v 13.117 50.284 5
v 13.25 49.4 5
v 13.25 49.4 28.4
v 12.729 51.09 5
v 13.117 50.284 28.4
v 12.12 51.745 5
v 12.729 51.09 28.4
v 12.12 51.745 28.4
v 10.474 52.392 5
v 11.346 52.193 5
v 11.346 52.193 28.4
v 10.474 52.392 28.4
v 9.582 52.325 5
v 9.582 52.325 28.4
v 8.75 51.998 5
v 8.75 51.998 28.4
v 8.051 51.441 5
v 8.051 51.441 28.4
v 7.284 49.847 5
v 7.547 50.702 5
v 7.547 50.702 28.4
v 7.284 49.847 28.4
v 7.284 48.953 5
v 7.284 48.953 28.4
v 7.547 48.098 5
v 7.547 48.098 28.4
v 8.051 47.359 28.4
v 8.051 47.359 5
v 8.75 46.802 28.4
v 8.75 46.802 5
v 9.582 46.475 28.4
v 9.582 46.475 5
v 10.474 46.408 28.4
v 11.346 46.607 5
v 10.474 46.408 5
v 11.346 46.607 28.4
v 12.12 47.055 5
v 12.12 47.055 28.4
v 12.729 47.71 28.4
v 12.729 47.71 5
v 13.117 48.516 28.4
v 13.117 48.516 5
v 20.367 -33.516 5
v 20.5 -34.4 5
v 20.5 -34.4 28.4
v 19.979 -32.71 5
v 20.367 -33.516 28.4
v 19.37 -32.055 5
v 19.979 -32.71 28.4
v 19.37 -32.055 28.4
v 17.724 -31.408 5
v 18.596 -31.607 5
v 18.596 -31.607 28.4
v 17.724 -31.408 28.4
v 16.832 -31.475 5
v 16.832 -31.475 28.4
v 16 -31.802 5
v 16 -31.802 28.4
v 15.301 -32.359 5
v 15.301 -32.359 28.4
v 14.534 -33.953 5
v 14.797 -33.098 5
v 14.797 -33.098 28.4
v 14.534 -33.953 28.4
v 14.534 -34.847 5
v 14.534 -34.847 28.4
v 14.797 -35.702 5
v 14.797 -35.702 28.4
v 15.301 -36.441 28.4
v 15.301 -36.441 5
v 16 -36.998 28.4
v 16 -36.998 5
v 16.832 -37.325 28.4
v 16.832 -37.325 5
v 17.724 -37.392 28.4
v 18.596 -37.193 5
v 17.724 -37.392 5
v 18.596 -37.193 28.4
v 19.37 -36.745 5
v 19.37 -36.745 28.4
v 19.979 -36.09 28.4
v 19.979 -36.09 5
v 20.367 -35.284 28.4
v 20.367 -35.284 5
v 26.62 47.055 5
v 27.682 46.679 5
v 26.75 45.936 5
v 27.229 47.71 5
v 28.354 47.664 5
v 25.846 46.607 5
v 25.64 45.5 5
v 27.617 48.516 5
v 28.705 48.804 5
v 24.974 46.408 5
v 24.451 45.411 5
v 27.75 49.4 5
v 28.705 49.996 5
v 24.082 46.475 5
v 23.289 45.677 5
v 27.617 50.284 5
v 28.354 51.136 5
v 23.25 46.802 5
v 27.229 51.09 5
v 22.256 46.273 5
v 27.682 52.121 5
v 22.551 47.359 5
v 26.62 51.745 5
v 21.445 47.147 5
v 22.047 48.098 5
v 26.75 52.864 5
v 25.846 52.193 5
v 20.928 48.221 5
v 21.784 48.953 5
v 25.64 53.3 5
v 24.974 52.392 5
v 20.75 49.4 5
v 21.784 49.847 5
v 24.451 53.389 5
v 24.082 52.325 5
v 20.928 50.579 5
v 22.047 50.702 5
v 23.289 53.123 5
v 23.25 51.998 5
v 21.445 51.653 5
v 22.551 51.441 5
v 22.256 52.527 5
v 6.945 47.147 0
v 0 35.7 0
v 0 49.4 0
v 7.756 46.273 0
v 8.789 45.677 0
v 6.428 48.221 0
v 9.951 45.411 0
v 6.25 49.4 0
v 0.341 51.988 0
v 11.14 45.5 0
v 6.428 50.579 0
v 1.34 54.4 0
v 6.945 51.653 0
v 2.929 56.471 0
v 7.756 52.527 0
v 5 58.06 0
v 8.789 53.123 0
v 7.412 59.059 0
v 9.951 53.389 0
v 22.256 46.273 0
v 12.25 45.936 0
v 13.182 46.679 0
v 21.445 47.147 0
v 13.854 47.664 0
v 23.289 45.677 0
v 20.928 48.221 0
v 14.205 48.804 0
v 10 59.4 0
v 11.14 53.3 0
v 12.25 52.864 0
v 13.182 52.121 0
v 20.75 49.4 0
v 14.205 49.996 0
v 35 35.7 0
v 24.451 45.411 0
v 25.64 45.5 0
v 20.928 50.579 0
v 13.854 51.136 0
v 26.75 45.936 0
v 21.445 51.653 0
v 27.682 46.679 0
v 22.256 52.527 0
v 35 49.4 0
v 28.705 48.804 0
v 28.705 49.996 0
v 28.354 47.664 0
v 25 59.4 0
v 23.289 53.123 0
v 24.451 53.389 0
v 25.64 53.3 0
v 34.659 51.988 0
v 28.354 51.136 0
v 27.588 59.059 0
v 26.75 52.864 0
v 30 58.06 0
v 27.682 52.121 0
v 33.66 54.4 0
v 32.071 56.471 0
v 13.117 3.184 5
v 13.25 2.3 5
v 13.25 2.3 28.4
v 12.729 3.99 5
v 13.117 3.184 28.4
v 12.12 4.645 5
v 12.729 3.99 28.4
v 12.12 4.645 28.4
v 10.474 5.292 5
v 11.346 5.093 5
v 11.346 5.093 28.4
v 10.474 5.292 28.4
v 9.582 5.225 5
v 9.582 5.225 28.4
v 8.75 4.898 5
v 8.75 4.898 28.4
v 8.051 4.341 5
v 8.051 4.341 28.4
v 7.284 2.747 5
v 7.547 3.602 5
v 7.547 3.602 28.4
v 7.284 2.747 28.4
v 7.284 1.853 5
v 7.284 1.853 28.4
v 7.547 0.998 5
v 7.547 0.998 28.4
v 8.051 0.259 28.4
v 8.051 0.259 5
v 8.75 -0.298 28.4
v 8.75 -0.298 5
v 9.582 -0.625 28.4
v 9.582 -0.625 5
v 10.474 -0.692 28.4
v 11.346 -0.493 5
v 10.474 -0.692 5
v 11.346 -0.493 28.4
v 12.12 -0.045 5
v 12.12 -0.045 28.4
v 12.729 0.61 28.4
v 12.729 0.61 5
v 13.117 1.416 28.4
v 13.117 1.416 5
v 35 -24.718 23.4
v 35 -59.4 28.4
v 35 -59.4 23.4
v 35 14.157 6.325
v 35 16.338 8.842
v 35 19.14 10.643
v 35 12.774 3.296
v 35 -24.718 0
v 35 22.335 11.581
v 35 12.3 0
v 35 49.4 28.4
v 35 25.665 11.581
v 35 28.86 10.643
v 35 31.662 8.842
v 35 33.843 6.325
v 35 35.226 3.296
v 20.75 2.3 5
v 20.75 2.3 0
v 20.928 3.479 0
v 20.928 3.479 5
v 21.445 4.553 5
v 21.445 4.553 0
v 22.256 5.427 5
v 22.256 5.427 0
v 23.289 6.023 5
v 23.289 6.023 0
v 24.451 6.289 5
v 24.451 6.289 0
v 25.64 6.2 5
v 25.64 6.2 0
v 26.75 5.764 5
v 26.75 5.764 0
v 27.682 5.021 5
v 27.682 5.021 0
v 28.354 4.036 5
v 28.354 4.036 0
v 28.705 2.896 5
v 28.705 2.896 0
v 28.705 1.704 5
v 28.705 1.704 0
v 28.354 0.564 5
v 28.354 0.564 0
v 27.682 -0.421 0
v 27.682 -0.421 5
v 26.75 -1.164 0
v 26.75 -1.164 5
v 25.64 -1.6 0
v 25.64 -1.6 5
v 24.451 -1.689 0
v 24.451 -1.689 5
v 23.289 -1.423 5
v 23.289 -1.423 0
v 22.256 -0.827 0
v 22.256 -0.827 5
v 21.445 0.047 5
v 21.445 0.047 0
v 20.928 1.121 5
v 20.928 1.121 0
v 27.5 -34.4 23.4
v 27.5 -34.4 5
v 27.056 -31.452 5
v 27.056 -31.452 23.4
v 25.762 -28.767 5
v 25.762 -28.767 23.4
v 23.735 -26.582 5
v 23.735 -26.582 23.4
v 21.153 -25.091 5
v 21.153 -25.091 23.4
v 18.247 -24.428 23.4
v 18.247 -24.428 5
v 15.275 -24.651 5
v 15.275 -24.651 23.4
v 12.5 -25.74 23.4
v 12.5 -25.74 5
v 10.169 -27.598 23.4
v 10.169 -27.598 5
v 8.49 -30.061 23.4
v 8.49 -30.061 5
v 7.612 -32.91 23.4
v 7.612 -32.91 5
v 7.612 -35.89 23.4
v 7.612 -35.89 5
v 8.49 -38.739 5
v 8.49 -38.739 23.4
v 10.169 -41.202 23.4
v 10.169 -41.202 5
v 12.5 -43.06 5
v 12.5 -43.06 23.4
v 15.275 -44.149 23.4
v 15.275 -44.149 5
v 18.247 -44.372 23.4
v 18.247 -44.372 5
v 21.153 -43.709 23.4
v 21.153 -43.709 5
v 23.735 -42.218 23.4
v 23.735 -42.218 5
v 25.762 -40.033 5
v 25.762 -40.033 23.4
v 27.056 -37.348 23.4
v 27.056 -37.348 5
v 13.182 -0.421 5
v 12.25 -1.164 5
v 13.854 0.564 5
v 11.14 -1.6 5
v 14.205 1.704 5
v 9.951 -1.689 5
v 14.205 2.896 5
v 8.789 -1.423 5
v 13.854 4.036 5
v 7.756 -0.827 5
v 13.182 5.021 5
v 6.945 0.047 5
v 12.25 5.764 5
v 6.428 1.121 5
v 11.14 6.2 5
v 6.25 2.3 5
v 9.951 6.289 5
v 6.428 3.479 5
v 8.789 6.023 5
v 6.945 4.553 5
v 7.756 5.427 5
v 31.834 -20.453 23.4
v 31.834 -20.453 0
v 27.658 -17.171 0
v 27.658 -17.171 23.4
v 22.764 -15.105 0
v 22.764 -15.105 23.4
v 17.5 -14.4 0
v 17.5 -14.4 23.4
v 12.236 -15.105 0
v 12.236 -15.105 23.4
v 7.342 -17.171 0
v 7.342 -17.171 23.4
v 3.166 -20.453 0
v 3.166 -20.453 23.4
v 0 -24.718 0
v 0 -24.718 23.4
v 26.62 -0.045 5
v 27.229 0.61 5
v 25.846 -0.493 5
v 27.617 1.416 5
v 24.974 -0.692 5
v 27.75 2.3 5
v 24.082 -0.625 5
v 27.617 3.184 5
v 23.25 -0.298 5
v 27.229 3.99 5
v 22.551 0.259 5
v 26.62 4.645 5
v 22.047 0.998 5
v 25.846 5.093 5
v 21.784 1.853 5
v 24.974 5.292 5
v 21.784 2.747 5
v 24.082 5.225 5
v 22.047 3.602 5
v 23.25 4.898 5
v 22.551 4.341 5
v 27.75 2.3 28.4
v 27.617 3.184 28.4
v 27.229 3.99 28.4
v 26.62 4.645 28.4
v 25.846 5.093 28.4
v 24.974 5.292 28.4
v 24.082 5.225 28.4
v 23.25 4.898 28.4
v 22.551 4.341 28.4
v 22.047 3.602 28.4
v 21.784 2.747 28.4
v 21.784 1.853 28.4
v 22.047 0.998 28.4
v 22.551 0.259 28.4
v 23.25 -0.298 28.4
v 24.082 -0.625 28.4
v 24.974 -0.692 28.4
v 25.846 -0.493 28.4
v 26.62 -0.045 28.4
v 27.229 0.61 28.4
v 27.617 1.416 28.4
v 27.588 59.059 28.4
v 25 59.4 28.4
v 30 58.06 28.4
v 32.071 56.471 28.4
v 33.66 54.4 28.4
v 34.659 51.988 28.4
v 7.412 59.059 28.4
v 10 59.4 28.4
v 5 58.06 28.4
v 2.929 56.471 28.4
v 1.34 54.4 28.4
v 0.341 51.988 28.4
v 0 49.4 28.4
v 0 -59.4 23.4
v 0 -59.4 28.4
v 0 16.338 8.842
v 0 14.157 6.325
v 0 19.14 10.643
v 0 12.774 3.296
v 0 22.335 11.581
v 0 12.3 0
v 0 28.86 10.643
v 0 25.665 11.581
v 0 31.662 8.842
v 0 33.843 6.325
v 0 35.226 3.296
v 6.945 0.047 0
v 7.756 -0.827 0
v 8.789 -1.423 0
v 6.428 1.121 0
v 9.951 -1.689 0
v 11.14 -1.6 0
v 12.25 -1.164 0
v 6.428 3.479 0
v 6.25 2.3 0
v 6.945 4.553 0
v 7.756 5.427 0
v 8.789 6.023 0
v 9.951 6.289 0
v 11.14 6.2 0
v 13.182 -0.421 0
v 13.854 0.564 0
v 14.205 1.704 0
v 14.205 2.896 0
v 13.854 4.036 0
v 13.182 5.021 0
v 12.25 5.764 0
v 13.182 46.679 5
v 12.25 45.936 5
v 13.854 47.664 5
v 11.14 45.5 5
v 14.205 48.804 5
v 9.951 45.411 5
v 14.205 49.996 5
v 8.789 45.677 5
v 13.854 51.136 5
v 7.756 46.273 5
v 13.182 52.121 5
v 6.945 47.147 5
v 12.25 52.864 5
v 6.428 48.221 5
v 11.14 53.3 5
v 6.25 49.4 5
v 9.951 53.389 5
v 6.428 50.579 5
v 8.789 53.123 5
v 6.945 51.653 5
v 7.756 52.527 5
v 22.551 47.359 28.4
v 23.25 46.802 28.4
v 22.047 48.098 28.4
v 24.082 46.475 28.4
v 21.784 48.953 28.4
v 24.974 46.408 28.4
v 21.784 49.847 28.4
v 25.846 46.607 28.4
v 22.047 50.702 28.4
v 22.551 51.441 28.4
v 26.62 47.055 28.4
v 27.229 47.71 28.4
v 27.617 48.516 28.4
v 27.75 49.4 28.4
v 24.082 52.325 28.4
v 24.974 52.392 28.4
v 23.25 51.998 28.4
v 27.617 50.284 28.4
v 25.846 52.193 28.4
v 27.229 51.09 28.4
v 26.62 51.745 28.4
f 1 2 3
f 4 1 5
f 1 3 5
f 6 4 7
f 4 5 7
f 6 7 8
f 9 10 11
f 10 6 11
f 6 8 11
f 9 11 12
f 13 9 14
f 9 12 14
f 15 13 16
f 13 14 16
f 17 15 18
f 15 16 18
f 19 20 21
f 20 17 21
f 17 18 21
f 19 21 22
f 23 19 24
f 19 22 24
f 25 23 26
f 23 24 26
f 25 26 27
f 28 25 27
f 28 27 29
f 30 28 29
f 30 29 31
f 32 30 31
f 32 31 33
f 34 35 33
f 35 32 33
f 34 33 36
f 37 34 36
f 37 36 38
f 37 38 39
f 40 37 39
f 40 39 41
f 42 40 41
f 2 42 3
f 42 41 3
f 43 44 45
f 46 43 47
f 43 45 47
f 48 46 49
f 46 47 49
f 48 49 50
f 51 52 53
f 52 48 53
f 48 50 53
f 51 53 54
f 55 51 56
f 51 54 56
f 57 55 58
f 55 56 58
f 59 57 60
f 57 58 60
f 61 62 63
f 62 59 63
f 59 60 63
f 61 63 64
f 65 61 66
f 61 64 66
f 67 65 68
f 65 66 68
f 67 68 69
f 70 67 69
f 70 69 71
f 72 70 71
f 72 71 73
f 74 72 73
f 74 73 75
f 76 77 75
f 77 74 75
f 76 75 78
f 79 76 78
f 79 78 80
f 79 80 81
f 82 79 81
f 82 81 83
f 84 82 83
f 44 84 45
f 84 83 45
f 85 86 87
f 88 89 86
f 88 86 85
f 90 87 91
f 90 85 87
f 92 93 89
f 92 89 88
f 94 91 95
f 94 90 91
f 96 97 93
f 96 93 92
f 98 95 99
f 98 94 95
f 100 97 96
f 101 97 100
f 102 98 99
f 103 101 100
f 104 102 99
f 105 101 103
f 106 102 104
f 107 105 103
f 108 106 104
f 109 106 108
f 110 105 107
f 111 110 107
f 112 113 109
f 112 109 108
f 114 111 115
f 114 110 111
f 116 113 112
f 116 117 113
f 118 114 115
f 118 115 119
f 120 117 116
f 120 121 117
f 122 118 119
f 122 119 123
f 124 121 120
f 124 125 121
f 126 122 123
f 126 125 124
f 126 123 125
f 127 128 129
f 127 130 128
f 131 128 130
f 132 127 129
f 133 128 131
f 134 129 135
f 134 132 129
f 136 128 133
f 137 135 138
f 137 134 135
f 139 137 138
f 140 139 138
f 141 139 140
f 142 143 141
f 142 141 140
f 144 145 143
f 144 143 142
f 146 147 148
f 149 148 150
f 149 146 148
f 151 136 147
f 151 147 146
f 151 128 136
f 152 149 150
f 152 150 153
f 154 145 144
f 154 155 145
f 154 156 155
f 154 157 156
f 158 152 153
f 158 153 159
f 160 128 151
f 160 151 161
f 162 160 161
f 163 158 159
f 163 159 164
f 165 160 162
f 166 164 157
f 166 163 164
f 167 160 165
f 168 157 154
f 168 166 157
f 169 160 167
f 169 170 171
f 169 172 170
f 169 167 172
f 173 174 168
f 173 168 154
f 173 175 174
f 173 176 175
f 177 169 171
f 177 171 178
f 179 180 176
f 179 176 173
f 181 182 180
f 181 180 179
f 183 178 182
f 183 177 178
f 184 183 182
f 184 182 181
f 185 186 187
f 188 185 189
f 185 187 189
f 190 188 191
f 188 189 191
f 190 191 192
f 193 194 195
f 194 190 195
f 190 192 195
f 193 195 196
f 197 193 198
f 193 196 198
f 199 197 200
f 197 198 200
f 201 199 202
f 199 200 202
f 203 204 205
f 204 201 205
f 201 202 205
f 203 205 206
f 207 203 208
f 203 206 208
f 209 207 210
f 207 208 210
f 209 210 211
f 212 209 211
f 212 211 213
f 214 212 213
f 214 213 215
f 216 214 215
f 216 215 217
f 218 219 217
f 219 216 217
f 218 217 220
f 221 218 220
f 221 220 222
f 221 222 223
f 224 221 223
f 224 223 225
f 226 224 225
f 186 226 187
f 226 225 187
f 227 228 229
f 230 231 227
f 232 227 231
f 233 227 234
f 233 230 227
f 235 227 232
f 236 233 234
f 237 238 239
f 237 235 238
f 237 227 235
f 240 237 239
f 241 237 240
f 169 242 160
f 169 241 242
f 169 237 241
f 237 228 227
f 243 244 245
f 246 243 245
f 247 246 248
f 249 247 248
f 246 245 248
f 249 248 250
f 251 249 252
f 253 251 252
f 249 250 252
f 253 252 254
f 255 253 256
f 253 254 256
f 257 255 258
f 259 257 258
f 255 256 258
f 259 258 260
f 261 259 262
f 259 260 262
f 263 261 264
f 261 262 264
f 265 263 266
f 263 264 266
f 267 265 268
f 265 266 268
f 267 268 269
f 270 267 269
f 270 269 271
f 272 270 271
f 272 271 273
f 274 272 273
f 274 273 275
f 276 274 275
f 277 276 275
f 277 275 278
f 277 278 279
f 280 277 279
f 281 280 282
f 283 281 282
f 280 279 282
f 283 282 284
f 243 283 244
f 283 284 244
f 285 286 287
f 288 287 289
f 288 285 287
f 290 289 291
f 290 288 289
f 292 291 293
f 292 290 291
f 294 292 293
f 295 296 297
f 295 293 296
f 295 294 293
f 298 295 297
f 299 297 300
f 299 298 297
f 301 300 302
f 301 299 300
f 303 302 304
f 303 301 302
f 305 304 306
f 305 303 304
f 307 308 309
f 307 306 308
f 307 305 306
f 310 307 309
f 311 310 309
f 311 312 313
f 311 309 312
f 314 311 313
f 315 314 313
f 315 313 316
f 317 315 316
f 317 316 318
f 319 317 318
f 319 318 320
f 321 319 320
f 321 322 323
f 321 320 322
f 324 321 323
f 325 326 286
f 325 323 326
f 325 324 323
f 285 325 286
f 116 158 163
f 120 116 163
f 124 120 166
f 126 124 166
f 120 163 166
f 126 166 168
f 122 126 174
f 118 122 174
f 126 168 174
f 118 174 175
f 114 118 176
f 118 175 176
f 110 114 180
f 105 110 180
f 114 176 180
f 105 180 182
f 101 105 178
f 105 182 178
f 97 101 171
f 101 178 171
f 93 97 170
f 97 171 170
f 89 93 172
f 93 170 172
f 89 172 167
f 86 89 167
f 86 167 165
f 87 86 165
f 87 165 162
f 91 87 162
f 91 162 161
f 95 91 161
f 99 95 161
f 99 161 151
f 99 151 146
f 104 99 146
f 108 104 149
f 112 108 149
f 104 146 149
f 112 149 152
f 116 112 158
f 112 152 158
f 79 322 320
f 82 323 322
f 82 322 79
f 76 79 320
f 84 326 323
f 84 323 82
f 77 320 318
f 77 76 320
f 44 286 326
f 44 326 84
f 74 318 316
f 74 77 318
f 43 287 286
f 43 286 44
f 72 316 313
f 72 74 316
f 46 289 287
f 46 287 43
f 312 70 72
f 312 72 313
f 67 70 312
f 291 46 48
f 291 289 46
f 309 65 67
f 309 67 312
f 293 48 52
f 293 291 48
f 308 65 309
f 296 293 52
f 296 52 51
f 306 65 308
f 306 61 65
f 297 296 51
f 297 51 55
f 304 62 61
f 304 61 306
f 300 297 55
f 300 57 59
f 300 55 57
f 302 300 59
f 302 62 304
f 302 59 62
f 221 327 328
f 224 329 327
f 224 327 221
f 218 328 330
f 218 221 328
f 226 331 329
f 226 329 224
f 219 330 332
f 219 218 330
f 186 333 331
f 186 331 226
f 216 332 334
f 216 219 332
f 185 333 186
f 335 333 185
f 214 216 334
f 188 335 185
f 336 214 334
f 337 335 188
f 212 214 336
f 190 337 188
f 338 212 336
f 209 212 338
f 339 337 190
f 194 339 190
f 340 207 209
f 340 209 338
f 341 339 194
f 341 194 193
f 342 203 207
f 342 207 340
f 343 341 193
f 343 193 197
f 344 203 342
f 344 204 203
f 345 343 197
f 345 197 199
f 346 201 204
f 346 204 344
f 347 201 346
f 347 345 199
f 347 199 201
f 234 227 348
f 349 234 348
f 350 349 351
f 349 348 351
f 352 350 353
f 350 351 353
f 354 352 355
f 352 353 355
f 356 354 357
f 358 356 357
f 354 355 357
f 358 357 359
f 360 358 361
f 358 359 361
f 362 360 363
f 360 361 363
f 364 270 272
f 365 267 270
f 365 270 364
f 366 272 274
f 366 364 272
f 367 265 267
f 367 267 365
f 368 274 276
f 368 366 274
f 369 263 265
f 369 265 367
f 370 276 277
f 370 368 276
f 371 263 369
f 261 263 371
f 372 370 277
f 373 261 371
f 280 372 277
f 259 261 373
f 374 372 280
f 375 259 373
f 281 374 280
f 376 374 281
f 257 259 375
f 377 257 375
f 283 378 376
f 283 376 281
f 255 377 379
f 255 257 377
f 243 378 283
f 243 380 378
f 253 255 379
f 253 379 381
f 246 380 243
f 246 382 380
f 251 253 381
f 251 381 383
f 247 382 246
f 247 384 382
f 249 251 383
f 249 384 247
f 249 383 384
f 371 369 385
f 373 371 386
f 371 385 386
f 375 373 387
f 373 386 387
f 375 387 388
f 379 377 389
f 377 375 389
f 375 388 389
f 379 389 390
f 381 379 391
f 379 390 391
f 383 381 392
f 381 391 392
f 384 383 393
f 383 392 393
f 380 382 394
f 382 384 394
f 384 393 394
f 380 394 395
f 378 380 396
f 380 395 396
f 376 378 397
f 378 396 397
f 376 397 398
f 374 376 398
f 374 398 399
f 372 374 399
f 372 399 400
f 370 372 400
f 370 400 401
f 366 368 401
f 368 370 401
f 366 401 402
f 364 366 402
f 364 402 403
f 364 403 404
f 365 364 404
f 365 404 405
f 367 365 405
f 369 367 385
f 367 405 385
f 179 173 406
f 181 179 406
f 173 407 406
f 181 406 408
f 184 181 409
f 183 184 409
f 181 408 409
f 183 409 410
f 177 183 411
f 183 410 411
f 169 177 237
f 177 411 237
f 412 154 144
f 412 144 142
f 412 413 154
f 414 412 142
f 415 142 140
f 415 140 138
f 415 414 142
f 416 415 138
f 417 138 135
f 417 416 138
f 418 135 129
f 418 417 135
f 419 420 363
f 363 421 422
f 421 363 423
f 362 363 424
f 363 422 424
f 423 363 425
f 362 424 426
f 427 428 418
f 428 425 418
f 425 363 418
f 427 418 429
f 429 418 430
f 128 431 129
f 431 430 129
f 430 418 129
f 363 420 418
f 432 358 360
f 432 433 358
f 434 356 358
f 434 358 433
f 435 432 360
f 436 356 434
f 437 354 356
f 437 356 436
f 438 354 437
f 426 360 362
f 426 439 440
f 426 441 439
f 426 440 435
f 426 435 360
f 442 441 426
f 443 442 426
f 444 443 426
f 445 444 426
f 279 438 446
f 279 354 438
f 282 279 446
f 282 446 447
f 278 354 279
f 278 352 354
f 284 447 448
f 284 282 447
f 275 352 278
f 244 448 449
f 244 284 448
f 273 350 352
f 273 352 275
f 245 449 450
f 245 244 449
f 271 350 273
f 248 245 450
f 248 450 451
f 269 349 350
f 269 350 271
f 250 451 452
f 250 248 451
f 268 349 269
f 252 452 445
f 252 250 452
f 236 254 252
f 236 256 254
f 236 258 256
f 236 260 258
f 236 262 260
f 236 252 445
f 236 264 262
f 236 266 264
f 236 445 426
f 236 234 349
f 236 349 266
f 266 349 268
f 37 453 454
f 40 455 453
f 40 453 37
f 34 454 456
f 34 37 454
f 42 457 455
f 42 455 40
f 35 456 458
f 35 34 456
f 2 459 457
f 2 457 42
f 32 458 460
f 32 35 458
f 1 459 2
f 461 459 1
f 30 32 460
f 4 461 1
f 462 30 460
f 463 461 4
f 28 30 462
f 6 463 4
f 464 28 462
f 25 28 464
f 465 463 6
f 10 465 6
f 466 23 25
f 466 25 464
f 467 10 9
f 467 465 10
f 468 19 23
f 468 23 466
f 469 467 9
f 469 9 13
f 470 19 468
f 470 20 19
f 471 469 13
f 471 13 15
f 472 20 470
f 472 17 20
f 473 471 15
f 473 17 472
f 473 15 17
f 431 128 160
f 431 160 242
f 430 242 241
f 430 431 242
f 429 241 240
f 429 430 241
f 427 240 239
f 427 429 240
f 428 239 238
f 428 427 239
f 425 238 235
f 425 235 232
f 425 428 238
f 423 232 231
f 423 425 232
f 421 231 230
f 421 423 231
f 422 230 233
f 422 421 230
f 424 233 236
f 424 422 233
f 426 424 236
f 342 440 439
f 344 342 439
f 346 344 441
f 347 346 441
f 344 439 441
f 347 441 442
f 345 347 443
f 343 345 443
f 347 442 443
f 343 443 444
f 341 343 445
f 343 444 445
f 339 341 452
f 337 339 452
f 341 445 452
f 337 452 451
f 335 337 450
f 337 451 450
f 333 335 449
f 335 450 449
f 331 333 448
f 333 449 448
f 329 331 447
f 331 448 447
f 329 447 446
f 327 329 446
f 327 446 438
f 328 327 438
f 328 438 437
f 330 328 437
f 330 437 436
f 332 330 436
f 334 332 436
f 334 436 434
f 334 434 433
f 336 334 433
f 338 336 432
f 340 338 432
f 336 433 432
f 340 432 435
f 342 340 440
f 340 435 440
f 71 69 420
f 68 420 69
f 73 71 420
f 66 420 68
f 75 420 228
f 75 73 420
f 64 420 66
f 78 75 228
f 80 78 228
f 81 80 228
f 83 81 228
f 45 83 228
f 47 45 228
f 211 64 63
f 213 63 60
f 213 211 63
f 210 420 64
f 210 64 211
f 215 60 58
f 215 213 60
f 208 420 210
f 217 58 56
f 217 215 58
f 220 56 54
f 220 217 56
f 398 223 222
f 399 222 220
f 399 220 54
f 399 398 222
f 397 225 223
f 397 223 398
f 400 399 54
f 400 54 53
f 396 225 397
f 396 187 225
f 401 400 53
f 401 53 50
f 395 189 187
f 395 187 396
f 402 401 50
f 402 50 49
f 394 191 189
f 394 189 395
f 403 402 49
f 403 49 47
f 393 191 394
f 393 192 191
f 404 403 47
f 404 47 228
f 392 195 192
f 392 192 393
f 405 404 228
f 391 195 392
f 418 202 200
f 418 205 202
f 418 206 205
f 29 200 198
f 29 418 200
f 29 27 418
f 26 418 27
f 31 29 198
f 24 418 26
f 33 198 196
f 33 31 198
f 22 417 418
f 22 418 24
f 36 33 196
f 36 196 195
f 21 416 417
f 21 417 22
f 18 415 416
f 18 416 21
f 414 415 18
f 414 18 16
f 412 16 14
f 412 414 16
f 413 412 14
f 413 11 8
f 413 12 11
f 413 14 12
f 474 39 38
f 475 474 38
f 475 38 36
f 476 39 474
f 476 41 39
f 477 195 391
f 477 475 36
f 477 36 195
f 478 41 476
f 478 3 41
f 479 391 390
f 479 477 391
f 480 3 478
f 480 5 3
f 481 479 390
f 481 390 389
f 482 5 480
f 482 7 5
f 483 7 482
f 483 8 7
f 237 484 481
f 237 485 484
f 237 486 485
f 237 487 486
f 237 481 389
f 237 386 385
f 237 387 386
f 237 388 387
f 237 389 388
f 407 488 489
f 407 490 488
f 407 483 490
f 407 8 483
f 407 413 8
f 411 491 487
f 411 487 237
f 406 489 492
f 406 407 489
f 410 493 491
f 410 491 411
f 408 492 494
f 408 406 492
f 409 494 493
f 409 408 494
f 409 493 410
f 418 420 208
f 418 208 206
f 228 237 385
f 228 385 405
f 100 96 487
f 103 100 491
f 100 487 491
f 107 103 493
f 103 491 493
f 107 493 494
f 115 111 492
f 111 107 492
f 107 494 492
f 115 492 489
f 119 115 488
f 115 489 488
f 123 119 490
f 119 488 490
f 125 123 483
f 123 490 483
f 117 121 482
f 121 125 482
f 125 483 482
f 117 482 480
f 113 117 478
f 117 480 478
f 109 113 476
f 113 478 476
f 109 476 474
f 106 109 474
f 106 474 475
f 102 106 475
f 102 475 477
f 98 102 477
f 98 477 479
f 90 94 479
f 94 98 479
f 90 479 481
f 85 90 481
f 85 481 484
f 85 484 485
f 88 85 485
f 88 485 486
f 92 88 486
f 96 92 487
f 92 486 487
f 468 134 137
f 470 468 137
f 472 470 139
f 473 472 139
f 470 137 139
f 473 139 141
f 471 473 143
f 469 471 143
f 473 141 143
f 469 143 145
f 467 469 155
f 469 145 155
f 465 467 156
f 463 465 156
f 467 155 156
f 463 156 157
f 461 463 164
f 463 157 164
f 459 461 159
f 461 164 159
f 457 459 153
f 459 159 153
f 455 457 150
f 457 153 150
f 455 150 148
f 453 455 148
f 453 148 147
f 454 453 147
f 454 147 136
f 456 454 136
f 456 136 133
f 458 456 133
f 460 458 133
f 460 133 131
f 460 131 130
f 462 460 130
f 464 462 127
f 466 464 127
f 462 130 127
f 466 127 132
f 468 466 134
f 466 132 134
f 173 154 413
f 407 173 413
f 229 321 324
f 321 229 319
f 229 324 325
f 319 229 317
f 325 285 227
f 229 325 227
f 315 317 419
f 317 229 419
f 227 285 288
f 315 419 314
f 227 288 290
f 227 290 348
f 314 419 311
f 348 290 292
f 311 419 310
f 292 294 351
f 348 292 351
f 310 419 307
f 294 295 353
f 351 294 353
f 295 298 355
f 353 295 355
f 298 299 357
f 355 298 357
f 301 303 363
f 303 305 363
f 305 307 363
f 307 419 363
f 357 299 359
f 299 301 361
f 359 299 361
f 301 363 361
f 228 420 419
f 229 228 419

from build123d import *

# Parameters (mm, degrees)
SKETCH1_R               = 11.7
BOSS_EXTRUDE1_DEPTH     = 35
SKETCH2_R               = 10
BOSS_EXTRUDE3_DEPTH     = 51.8
SKETCH3_R               = 3
CUT_EXTRUDE1_DEPTH      = 1
CUT_EXTRUDE1_DEPTH_BACK = 57.8
SKETCH6_W               = 28.4
SKETCH6_H               = 118.8
CUT_EXTRUDE3_DEPTH      = 36
SKETCH8_R               = 10
SKETCH8_R_2             = 3
CUT_EXTRUDE4_DEPTH      = 5
SKETCH7_R               = 4
SKETCH7_R_2             = 3
CUT_EXTRUDE5_DEPTH      = 5
FILLET1_R               = 10


with BuildPart() as part:
    # Sketch1 → Boss-Extrude1 (new body)
    with BuildSketch(Plane(origin=(0, 0, 0), x_dir=(0, 0, -1), z_dir=(1, 0, 0))):
        Polygon((-28.4, -59.4), (-23.4, -59.4), (-23.4, -14.4), (23.4, -14.4), (23.4, -59.4), (28.4, -59.4), (28.4, 59.4), (-28.4, 59.4), align=None)
        with Locations((0, 24)):
            Circle(SKETCH1_R, mode=Mode.SUBTRACT)
    extrude(amount=BOSS_EXTRUDE1_DEPTH)

    # Sketch2 → Boss-Extrude3 (add)
    with BuildSketch(Plane.XY.offset(28.4)):
        with Locations((17.5, -34.4)):
            Circle(SKETCH2_R)
        with BuildLine():
            Line((0, -24.717541634), (0, -13.4))
            Line((0, -13.4), (35, -13.4))
            Line((35, -13.4), (35, -24.717541634))
            ThreePointArc((35, -24.717541634), (17.5, -14.4), (0, -24.717541634))
        make_face()
    extrude(amount=-BOSS_EXTRUDE3_DEPTH)

    # Sketch3 → Cut-Extrude1 (cut, two sides)
    with BuildSketch(Plane.XY.offset(28.4)) as cut_extrude1_sk:
        with Locations((10.25, 49.4)):
            Circle(SKETCH3_R)
        with Locations((17.5, -34.4)):
            Circle(SKETCH3_R)
        with Locations((10.25, 2.3)):
            Circle(SKETCH3_R)
        with Locations((24.75, 2.3)):
            Circle(SKETCH3_R)
        with Locations((24.75, 49.4)):
            Circle(SKETCH3_R)
    extrude(amount=CUT_EXTRUDE1_DEPTH, mode=Mode.SUBTRACT)
    extrude(cut_extrude1_sk.sketch, amount=-CUT_EXTRUDE1_DEPTH_BACK, mode=Mode.SUBTRACT)

    # Sketch6 → Cut-Extrude3 (cut, through all)
    with BuildSketch(Plane(origin=(35, 0, 0), x_dir=(0, 0, -1), z_dir=(1, 0, 0))):
        with Locations((14.2, 0)):
            Rectangle(SKETCH6_W, SKETCH6_H)
    extrude(amount=-CUT_EXTRUDE3_DEPTH, mode=Mode.SUBTRACT)

    # Sketch8 → Cut-Extrude4 (cut)
    with BuildSketch(Plane(origin=(0, 0, 0), x_dir=(-1, 0, 0), z_dir=(0, 0, -1))):
        with Locations((-17.5, -34.4)):
            Circle(SKETCH8_R)
        with Locations((-17.5, -34.4)):
            Circle(SKETCH8_R_2, mode=Mode.SUBTRACT)
    extrude(amount=-CUT_EXTRUDE4_DEPTH, mode=Mode.SUBTRACT)

    # Sketch7 → Cut-Extrude5 (cut)
    with BuildSketch(Plane(origin=(0, 0, 0), x_dir=(-1, 0, 0), z_dir=(0, 0, -1))):
        with Locations((-24.75, 49.4)):
            Circle(SKETCH7_R)
        with Locations((-24.75, 49.4)):
            Circle(SKETCH7_R_2, mode=Mode.SUBTRACT)
        with Locations((-10.25, 49.4)):
            Circle(SKETCH7_R)
        with Locations((-10.25, 49.4)):
            Circle(SKETCH7_R_2, mode=Mode.SUBTRACT)
        with Locations((-24.75, 2.3)):
            Circle(SKETCH7_R)
        with Locations((-24.75, 2.3)):
            Circle(SKETCH7_R_2, mode=Mode.SUBTRACT)
        with Locations((-10.25, 2.3)):
            Circle(SKETCH7_R)
        with Locations((-10.25, 2.3)):
            Circle(SKETCH7_R_2, mode=Mode.SUBTRACT)
    extrude(amount=-CUT_EXTRUDE5_DEPTH, mode=Mode.SUBTRACT)

    # Fillet1
    fillet1_edges = [part.edges().sort_by_distance(p)[0] for p in [
        (0, 59.4, 14.2),
        (35, 59.4, 14.2),
    ]]
    fillet(fillet1_edges, radius=FILLET1_R)


solid = part.part
